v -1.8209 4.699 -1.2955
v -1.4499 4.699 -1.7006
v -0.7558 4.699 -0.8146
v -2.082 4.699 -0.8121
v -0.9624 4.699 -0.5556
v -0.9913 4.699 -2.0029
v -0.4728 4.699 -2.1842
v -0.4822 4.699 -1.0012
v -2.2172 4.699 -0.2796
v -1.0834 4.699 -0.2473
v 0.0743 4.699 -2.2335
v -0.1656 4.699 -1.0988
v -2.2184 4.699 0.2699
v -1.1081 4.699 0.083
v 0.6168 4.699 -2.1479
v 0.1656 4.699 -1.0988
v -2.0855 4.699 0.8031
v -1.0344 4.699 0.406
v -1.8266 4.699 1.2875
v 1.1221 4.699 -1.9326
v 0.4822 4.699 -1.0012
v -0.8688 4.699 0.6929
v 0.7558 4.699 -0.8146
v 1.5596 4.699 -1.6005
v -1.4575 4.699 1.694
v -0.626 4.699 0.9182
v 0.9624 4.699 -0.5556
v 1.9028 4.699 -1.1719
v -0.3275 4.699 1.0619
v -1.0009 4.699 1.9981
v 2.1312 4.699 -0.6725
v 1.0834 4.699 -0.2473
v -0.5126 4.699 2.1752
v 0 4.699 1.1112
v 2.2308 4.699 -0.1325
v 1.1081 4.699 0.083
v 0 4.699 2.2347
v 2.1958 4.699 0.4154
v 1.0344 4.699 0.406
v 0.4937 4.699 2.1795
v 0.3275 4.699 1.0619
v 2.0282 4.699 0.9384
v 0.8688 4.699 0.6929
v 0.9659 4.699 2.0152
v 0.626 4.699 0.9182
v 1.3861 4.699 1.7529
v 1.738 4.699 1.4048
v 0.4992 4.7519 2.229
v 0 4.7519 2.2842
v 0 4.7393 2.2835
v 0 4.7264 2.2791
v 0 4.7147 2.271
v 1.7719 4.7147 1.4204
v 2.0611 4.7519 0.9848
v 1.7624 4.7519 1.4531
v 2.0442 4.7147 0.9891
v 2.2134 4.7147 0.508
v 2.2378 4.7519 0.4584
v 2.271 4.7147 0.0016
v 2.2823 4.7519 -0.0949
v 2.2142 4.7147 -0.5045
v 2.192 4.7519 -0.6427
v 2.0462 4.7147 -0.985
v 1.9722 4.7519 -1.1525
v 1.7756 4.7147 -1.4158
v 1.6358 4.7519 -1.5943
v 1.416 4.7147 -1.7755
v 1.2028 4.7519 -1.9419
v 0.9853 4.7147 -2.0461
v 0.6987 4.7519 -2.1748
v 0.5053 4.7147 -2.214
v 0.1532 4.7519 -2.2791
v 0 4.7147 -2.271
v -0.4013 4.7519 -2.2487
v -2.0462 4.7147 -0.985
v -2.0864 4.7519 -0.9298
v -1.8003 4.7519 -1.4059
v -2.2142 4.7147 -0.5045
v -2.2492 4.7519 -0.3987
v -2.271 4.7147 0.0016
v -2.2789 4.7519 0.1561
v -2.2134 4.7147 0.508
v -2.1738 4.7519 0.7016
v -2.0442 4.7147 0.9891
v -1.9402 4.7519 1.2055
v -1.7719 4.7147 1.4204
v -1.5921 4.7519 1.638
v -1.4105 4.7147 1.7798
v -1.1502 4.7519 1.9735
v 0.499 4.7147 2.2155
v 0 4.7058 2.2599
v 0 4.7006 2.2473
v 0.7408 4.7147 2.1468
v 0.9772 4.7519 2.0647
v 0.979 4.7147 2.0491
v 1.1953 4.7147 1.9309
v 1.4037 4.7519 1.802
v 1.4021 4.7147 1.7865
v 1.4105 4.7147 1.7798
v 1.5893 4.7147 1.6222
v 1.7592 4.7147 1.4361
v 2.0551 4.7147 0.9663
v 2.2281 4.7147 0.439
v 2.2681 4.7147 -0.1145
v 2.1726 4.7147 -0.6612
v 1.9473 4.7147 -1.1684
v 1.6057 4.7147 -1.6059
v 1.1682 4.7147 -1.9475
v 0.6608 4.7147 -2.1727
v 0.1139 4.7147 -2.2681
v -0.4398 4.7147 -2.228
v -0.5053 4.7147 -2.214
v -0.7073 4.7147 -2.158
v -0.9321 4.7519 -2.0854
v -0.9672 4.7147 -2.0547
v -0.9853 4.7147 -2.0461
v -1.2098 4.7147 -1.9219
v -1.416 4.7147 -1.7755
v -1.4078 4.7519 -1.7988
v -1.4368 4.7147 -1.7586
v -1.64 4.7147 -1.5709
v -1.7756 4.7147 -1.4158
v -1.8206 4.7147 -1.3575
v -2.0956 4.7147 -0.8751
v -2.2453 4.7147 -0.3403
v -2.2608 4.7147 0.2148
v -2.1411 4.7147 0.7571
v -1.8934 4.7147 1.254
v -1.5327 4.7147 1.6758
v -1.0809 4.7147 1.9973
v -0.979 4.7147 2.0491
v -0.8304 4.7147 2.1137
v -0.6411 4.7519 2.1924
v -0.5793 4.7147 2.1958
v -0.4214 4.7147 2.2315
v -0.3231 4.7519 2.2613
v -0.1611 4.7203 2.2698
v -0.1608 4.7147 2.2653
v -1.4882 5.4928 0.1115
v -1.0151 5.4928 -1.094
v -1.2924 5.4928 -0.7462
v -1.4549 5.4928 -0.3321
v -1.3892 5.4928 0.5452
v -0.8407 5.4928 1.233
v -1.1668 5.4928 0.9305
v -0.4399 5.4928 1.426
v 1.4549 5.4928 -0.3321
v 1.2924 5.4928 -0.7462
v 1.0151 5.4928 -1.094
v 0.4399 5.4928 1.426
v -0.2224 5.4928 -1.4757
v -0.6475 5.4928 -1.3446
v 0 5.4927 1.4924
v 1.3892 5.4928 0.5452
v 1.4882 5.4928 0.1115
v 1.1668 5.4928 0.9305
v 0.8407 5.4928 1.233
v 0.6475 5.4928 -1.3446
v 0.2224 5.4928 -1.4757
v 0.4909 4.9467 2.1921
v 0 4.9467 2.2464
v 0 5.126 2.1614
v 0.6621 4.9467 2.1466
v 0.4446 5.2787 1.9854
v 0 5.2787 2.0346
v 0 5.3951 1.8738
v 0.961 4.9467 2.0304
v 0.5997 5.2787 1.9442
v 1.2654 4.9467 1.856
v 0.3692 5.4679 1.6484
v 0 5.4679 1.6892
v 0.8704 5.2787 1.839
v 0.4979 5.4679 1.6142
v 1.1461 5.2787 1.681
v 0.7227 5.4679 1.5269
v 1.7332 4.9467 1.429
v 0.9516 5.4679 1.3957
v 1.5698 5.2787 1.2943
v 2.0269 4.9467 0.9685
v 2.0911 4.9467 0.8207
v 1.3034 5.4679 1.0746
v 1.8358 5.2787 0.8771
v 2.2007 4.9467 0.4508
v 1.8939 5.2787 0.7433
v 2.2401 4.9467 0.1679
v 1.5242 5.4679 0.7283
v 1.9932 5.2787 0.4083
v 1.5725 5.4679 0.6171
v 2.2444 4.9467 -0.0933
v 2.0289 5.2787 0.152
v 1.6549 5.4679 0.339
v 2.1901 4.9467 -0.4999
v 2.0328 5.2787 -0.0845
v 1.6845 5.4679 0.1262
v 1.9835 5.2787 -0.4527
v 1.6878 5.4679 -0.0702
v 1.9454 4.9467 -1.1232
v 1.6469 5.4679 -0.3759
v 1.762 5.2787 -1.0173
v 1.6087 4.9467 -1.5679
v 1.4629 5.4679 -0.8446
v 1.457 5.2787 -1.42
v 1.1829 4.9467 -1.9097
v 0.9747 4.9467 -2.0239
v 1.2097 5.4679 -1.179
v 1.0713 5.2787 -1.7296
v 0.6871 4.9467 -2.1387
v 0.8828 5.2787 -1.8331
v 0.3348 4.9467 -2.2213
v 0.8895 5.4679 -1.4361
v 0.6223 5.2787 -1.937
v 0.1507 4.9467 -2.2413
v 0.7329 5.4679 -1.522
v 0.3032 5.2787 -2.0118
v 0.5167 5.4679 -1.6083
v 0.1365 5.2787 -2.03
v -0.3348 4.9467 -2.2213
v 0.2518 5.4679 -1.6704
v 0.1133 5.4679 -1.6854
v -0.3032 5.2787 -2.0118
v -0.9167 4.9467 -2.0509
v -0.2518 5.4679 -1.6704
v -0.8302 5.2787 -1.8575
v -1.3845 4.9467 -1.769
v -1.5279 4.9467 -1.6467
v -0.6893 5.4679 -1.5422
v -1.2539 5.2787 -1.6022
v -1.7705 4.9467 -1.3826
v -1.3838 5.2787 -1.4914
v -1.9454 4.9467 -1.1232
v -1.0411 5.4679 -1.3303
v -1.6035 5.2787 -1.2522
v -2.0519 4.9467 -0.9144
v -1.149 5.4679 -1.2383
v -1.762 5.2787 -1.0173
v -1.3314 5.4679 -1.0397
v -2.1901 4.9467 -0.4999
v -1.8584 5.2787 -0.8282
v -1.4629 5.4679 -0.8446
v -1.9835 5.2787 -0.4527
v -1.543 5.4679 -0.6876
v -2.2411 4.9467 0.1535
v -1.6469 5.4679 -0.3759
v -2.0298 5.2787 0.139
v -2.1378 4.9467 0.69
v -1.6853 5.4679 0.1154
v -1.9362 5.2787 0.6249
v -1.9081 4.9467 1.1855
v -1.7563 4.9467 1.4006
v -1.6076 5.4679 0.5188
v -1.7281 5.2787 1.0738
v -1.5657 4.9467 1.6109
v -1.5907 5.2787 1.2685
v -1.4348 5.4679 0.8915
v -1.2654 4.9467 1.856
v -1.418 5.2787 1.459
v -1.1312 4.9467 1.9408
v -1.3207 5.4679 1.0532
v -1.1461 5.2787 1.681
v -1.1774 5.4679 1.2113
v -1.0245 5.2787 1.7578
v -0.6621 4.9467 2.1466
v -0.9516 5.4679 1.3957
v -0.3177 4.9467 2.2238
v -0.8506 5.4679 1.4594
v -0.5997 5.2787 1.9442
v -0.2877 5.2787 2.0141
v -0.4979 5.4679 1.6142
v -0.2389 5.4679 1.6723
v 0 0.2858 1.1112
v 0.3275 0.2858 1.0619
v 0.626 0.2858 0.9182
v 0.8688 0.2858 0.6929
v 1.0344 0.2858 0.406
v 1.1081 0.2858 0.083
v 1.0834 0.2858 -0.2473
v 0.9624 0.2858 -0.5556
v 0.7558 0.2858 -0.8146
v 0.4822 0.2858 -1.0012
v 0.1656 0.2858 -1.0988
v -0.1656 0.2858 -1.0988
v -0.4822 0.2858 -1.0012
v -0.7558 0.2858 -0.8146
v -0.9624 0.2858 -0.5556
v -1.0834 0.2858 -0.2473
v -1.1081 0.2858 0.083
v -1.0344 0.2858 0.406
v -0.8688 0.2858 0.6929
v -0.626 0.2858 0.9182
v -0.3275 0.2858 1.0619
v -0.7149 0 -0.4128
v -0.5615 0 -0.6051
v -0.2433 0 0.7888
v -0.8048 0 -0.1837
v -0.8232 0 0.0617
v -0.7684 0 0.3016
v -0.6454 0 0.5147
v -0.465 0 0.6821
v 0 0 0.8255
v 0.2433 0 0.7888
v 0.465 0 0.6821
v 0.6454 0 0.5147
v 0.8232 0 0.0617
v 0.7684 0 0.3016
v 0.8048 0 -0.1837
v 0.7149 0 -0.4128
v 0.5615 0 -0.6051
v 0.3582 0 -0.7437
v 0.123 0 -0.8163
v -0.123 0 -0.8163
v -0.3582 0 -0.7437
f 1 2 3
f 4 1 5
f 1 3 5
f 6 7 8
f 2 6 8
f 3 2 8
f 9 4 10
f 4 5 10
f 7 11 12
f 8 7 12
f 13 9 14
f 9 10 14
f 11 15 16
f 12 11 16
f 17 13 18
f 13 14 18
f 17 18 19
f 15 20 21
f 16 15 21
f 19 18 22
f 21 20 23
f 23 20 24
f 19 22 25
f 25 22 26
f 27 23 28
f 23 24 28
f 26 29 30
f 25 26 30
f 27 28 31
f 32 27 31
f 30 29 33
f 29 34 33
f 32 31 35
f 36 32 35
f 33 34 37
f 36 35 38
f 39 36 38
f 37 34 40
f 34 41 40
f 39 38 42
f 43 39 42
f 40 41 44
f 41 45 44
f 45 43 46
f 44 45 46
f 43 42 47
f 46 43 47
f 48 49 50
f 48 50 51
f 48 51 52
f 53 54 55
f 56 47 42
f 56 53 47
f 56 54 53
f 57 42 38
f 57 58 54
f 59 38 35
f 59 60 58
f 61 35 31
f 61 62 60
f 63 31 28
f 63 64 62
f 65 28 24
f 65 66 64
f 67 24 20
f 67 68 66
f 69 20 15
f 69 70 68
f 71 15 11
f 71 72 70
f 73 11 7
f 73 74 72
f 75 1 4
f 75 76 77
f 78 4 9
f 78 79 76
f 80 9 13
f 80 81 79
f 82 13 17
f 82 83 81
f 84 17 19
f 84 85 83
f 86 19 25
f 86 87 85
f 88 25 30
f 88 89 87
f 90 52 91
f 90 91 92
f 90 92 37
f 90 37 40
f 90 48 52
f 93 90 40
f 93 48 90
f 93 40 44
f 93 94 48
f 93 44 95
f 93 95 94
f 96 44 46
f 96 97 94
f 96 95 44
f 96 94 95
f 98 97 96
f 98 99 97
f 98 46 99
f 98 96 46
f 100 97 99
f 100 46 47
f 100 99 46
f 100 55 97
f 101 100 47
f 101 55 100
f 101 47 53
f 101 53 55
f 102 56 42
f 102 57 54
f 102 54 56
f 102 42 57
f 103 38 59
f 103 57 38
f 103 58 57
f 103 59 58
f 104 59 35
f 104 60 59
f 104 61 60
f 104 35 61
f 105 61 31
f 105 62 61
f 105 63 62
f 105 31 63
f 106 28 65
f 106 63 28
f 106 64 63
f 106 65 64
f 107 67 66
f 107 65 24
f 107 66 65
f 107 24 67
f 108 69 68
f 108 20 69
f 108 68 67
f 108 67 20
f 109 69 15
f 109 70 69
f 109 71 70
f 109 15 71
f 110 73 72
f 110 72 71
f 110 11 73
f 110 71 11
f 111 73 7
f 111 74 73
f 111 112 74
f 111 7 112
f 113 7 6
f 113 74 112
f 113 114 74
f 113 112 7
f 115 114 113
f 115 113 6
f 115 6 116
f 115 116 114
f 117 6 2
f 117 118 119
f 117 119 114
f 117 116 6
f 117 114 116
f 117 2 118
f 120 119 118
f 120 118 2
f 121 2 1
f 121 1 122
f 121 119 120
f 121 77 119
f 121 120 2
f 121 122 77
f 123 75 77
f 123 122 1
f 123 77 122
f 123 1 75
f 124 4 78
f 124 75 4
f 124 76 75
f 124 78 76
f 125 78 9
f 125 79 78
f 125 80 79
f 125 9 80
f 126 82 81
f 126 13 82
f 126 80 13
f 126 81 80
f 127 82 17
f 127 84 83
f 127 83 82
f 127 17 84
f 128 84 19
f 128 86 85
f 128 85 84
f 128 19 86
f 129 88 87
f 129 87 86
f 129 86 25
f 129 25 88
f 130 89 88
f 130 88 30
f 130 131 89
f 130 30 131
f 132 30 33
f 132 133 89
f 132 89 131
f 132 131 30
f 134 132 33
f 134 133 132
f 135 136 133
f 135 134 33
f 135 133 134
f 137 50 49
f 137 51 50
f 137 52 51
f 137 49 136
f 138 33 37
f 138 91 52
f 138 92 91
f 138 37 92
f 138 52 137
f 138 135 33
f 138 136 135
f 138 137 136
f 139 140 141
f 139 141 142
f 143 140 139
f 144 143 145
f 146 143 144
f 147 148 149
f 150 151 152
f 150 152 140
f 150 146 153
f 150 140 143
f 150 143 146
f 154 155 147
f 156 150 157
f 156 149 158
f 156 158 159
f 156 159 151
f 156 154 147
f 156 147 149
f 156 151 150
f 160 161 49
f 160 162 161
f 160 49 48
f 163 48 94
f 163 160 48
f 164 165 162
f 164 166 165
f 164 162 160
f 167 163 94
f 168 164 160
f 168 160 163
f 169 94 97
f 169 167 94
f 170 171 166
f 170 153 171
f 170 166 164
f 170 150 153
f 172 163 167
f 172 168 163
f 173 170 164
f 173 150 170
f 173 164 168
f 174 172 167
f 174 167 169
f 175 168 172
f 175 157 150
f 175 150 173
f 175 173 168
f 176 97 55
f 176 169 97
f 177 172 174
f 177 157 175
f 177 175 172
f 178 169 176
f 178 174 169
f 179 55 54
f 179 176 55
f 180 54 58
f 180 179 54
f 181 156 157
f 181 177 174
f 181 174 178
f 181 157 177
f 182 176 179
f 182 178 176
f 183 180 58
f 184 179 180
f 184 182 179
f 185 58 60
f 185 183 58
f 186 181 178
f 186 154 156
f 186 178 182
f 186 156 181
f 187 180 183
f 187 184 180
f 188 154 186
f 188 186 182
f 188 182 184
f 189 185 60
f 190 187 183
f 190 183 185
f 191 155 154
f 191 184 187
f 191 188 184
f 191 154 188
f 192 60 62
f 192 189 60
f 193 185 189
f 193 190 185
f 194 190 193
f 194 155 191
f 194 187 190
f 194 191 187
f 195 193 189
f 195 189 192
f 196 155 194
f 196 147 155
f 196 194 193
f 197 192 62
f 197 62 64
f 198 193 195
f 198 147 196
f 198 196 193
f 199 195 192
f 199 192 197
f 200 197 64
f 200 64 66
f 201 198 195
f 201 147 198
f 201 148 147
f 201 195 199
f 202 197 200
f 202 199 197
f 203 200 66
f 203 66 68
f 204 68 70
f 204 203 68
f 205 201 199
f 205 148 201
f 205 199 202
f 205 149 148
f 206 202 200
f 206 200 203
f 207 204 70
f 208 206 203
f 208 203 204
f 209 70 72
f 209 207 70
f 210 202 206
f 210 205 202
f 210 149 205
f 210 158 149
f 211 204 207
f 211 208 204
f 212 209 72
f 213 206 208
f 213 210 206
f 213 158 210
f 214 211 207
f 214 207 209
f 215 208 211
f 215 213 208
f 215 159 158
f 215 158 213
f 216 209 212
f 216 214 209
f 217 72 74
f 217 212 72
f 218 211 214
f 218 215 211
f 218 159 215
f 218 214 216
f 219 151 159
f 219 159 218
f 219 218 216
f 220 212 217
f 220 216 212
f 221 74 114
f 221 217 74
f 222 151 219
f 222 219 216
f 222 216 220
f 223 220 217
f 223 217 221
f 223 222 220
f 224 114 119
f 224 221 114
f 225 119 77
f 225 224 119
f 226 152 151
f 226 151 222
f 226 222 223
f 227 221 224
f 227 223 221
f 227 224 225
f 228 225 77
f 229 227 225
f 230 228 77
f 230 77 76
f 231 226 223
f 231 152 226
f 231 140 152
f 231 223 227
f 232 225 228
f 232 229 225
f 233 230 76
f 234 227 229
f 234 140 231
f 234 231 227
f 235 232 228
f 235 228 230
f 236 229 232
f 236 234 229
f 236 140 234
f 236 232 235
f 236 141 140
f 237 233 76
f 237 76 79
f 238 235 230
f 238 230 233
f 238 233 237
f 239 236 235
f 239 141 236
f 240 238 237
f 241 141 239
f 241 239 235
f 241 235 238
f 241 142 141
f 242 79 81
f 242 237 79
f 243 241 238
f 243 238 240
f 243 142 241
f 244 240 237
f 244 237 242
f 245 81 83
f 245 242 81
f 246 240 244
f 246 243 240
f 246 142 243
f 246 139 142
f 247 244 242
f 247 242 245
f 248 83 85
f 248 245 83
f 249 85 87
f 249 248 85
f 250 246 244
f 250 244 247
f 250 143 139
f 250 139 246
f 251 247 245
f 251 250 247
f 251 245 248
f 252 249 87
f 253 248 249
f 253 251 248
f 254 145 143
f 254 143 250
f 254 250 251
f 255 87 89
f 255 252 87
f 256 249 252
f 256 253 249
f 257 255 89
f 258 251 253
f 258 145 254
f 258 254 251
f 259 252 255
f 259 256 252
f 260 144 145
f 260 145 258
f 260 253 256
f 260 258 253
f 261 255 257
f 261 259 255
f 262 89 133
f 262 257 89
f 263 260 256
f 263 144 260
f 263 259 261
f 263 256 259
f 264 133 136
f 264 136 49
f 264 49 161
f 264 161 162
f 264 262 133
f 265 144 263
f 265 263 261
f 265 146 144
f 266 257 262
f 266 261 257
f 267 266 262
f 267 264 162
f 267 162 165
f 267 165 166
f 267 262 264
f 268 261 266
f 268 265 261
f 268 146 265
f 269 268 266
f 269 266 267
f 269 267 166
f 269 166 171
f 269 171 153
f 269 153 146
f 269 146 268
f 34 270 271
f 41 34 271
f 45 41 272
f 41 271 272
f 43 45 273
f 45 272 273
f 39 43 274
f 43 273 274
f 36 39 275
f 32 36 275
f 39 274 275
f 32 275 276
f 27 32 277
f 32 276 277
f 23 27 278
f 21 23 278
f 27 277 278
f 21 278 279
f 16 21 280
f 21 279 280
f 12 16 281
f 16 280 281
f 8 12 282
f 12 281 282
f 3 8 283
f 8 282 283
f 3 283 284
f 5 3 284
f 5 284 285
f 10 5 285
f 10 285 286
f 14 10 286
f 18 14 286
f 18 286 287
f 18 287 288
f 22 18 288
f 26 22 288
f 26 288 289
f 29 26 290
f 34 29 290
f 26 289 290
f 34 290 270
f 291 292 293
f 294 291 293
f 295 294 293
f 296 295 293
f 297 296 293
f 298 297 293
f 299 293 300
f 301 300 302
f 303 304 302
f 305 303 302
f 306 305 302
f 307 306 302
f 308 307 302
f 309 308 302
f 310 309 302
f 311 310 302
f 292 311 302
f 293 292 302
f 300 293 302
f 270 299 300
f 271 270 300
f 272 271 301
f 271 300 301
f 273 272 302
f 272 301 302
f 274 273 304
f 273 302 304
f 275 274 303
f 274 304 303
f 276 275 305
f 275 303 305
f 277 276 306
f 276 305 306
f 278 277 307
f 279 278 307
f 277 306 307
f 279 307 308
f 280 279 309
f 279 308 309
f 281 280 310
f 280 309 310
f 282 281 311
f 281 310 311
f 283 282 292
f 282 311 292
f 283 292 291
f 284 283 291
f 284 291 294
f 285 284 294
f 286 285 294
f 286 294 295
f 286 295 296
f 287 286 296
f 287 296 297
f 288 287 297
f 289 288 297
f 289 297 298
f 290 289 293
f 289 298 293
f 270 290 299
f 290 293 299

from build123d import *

# Parameters (mm, degrees)
SKETCH1_R           = 1.11125
BOSS_EXTRUDE1_DEPTH = 4.699
SKETCH2_R           = 2.286
BOSS_EXTRUDE2_DEPTH = 0.79375
FILLET1_R           = 0.79375
FILLET2_R           = 0.049609375
CHAMFER1_SIZE       = 0.28575


with BuildPart() as part:
    # Sketch1 → Boss-Extrude1 (new body)
    with BuildSketch(Plane(origin=(0, 0, 0), x_dir=(1, 0, 0), z_dir=(0, 1, 0))):
        with Locations(Location((0, 0, 0), (0, 0, 270))):
            Circle(SKETCH1_R)
    extrude(amount=BOSS_EXTRUDE1_DEPTH)

    # Sketch2 → Boss-Extrude2 (add)
    with BuildSketch(Plane(origin=(0, 4.699, 0), x_dir=(1, 0, 0), z_dir=(0, 1, 0))):
        with Locations(Location((0, 0, 0), (0, 0, 270))):
            Circle(SKETCH2_R)
    extrude(amount=BOSS_EXTRUDE2_DEPTH)

    # Fillet1
    fillet1_edges = [part.edges().sort_by_distance(p)[0] for p in [
        (0, 5.49275, -2.286),
    ]]
    fillet(fillet1_edges, radius=FILLET1_R - 0.0001)  # a hair under: the kernel refuses the full size

    # Fillet2
    fillet2_edges = [part.edges().sort_by_distance(p)[0] for p in [
        (0, 4.699, -2.286),
    ]]
    fillet(fillet2_edges, radius=FILLET2_R)

    # Chamfer1
    chamfer1_edges = [part.edges().sort_by_distance(p)[0] for p in [
        (0, 0, -1.11125),
    ]]
    chamfer(chamfer1_edges, length=CHAMFER1_SIZE)


solid = part.part
